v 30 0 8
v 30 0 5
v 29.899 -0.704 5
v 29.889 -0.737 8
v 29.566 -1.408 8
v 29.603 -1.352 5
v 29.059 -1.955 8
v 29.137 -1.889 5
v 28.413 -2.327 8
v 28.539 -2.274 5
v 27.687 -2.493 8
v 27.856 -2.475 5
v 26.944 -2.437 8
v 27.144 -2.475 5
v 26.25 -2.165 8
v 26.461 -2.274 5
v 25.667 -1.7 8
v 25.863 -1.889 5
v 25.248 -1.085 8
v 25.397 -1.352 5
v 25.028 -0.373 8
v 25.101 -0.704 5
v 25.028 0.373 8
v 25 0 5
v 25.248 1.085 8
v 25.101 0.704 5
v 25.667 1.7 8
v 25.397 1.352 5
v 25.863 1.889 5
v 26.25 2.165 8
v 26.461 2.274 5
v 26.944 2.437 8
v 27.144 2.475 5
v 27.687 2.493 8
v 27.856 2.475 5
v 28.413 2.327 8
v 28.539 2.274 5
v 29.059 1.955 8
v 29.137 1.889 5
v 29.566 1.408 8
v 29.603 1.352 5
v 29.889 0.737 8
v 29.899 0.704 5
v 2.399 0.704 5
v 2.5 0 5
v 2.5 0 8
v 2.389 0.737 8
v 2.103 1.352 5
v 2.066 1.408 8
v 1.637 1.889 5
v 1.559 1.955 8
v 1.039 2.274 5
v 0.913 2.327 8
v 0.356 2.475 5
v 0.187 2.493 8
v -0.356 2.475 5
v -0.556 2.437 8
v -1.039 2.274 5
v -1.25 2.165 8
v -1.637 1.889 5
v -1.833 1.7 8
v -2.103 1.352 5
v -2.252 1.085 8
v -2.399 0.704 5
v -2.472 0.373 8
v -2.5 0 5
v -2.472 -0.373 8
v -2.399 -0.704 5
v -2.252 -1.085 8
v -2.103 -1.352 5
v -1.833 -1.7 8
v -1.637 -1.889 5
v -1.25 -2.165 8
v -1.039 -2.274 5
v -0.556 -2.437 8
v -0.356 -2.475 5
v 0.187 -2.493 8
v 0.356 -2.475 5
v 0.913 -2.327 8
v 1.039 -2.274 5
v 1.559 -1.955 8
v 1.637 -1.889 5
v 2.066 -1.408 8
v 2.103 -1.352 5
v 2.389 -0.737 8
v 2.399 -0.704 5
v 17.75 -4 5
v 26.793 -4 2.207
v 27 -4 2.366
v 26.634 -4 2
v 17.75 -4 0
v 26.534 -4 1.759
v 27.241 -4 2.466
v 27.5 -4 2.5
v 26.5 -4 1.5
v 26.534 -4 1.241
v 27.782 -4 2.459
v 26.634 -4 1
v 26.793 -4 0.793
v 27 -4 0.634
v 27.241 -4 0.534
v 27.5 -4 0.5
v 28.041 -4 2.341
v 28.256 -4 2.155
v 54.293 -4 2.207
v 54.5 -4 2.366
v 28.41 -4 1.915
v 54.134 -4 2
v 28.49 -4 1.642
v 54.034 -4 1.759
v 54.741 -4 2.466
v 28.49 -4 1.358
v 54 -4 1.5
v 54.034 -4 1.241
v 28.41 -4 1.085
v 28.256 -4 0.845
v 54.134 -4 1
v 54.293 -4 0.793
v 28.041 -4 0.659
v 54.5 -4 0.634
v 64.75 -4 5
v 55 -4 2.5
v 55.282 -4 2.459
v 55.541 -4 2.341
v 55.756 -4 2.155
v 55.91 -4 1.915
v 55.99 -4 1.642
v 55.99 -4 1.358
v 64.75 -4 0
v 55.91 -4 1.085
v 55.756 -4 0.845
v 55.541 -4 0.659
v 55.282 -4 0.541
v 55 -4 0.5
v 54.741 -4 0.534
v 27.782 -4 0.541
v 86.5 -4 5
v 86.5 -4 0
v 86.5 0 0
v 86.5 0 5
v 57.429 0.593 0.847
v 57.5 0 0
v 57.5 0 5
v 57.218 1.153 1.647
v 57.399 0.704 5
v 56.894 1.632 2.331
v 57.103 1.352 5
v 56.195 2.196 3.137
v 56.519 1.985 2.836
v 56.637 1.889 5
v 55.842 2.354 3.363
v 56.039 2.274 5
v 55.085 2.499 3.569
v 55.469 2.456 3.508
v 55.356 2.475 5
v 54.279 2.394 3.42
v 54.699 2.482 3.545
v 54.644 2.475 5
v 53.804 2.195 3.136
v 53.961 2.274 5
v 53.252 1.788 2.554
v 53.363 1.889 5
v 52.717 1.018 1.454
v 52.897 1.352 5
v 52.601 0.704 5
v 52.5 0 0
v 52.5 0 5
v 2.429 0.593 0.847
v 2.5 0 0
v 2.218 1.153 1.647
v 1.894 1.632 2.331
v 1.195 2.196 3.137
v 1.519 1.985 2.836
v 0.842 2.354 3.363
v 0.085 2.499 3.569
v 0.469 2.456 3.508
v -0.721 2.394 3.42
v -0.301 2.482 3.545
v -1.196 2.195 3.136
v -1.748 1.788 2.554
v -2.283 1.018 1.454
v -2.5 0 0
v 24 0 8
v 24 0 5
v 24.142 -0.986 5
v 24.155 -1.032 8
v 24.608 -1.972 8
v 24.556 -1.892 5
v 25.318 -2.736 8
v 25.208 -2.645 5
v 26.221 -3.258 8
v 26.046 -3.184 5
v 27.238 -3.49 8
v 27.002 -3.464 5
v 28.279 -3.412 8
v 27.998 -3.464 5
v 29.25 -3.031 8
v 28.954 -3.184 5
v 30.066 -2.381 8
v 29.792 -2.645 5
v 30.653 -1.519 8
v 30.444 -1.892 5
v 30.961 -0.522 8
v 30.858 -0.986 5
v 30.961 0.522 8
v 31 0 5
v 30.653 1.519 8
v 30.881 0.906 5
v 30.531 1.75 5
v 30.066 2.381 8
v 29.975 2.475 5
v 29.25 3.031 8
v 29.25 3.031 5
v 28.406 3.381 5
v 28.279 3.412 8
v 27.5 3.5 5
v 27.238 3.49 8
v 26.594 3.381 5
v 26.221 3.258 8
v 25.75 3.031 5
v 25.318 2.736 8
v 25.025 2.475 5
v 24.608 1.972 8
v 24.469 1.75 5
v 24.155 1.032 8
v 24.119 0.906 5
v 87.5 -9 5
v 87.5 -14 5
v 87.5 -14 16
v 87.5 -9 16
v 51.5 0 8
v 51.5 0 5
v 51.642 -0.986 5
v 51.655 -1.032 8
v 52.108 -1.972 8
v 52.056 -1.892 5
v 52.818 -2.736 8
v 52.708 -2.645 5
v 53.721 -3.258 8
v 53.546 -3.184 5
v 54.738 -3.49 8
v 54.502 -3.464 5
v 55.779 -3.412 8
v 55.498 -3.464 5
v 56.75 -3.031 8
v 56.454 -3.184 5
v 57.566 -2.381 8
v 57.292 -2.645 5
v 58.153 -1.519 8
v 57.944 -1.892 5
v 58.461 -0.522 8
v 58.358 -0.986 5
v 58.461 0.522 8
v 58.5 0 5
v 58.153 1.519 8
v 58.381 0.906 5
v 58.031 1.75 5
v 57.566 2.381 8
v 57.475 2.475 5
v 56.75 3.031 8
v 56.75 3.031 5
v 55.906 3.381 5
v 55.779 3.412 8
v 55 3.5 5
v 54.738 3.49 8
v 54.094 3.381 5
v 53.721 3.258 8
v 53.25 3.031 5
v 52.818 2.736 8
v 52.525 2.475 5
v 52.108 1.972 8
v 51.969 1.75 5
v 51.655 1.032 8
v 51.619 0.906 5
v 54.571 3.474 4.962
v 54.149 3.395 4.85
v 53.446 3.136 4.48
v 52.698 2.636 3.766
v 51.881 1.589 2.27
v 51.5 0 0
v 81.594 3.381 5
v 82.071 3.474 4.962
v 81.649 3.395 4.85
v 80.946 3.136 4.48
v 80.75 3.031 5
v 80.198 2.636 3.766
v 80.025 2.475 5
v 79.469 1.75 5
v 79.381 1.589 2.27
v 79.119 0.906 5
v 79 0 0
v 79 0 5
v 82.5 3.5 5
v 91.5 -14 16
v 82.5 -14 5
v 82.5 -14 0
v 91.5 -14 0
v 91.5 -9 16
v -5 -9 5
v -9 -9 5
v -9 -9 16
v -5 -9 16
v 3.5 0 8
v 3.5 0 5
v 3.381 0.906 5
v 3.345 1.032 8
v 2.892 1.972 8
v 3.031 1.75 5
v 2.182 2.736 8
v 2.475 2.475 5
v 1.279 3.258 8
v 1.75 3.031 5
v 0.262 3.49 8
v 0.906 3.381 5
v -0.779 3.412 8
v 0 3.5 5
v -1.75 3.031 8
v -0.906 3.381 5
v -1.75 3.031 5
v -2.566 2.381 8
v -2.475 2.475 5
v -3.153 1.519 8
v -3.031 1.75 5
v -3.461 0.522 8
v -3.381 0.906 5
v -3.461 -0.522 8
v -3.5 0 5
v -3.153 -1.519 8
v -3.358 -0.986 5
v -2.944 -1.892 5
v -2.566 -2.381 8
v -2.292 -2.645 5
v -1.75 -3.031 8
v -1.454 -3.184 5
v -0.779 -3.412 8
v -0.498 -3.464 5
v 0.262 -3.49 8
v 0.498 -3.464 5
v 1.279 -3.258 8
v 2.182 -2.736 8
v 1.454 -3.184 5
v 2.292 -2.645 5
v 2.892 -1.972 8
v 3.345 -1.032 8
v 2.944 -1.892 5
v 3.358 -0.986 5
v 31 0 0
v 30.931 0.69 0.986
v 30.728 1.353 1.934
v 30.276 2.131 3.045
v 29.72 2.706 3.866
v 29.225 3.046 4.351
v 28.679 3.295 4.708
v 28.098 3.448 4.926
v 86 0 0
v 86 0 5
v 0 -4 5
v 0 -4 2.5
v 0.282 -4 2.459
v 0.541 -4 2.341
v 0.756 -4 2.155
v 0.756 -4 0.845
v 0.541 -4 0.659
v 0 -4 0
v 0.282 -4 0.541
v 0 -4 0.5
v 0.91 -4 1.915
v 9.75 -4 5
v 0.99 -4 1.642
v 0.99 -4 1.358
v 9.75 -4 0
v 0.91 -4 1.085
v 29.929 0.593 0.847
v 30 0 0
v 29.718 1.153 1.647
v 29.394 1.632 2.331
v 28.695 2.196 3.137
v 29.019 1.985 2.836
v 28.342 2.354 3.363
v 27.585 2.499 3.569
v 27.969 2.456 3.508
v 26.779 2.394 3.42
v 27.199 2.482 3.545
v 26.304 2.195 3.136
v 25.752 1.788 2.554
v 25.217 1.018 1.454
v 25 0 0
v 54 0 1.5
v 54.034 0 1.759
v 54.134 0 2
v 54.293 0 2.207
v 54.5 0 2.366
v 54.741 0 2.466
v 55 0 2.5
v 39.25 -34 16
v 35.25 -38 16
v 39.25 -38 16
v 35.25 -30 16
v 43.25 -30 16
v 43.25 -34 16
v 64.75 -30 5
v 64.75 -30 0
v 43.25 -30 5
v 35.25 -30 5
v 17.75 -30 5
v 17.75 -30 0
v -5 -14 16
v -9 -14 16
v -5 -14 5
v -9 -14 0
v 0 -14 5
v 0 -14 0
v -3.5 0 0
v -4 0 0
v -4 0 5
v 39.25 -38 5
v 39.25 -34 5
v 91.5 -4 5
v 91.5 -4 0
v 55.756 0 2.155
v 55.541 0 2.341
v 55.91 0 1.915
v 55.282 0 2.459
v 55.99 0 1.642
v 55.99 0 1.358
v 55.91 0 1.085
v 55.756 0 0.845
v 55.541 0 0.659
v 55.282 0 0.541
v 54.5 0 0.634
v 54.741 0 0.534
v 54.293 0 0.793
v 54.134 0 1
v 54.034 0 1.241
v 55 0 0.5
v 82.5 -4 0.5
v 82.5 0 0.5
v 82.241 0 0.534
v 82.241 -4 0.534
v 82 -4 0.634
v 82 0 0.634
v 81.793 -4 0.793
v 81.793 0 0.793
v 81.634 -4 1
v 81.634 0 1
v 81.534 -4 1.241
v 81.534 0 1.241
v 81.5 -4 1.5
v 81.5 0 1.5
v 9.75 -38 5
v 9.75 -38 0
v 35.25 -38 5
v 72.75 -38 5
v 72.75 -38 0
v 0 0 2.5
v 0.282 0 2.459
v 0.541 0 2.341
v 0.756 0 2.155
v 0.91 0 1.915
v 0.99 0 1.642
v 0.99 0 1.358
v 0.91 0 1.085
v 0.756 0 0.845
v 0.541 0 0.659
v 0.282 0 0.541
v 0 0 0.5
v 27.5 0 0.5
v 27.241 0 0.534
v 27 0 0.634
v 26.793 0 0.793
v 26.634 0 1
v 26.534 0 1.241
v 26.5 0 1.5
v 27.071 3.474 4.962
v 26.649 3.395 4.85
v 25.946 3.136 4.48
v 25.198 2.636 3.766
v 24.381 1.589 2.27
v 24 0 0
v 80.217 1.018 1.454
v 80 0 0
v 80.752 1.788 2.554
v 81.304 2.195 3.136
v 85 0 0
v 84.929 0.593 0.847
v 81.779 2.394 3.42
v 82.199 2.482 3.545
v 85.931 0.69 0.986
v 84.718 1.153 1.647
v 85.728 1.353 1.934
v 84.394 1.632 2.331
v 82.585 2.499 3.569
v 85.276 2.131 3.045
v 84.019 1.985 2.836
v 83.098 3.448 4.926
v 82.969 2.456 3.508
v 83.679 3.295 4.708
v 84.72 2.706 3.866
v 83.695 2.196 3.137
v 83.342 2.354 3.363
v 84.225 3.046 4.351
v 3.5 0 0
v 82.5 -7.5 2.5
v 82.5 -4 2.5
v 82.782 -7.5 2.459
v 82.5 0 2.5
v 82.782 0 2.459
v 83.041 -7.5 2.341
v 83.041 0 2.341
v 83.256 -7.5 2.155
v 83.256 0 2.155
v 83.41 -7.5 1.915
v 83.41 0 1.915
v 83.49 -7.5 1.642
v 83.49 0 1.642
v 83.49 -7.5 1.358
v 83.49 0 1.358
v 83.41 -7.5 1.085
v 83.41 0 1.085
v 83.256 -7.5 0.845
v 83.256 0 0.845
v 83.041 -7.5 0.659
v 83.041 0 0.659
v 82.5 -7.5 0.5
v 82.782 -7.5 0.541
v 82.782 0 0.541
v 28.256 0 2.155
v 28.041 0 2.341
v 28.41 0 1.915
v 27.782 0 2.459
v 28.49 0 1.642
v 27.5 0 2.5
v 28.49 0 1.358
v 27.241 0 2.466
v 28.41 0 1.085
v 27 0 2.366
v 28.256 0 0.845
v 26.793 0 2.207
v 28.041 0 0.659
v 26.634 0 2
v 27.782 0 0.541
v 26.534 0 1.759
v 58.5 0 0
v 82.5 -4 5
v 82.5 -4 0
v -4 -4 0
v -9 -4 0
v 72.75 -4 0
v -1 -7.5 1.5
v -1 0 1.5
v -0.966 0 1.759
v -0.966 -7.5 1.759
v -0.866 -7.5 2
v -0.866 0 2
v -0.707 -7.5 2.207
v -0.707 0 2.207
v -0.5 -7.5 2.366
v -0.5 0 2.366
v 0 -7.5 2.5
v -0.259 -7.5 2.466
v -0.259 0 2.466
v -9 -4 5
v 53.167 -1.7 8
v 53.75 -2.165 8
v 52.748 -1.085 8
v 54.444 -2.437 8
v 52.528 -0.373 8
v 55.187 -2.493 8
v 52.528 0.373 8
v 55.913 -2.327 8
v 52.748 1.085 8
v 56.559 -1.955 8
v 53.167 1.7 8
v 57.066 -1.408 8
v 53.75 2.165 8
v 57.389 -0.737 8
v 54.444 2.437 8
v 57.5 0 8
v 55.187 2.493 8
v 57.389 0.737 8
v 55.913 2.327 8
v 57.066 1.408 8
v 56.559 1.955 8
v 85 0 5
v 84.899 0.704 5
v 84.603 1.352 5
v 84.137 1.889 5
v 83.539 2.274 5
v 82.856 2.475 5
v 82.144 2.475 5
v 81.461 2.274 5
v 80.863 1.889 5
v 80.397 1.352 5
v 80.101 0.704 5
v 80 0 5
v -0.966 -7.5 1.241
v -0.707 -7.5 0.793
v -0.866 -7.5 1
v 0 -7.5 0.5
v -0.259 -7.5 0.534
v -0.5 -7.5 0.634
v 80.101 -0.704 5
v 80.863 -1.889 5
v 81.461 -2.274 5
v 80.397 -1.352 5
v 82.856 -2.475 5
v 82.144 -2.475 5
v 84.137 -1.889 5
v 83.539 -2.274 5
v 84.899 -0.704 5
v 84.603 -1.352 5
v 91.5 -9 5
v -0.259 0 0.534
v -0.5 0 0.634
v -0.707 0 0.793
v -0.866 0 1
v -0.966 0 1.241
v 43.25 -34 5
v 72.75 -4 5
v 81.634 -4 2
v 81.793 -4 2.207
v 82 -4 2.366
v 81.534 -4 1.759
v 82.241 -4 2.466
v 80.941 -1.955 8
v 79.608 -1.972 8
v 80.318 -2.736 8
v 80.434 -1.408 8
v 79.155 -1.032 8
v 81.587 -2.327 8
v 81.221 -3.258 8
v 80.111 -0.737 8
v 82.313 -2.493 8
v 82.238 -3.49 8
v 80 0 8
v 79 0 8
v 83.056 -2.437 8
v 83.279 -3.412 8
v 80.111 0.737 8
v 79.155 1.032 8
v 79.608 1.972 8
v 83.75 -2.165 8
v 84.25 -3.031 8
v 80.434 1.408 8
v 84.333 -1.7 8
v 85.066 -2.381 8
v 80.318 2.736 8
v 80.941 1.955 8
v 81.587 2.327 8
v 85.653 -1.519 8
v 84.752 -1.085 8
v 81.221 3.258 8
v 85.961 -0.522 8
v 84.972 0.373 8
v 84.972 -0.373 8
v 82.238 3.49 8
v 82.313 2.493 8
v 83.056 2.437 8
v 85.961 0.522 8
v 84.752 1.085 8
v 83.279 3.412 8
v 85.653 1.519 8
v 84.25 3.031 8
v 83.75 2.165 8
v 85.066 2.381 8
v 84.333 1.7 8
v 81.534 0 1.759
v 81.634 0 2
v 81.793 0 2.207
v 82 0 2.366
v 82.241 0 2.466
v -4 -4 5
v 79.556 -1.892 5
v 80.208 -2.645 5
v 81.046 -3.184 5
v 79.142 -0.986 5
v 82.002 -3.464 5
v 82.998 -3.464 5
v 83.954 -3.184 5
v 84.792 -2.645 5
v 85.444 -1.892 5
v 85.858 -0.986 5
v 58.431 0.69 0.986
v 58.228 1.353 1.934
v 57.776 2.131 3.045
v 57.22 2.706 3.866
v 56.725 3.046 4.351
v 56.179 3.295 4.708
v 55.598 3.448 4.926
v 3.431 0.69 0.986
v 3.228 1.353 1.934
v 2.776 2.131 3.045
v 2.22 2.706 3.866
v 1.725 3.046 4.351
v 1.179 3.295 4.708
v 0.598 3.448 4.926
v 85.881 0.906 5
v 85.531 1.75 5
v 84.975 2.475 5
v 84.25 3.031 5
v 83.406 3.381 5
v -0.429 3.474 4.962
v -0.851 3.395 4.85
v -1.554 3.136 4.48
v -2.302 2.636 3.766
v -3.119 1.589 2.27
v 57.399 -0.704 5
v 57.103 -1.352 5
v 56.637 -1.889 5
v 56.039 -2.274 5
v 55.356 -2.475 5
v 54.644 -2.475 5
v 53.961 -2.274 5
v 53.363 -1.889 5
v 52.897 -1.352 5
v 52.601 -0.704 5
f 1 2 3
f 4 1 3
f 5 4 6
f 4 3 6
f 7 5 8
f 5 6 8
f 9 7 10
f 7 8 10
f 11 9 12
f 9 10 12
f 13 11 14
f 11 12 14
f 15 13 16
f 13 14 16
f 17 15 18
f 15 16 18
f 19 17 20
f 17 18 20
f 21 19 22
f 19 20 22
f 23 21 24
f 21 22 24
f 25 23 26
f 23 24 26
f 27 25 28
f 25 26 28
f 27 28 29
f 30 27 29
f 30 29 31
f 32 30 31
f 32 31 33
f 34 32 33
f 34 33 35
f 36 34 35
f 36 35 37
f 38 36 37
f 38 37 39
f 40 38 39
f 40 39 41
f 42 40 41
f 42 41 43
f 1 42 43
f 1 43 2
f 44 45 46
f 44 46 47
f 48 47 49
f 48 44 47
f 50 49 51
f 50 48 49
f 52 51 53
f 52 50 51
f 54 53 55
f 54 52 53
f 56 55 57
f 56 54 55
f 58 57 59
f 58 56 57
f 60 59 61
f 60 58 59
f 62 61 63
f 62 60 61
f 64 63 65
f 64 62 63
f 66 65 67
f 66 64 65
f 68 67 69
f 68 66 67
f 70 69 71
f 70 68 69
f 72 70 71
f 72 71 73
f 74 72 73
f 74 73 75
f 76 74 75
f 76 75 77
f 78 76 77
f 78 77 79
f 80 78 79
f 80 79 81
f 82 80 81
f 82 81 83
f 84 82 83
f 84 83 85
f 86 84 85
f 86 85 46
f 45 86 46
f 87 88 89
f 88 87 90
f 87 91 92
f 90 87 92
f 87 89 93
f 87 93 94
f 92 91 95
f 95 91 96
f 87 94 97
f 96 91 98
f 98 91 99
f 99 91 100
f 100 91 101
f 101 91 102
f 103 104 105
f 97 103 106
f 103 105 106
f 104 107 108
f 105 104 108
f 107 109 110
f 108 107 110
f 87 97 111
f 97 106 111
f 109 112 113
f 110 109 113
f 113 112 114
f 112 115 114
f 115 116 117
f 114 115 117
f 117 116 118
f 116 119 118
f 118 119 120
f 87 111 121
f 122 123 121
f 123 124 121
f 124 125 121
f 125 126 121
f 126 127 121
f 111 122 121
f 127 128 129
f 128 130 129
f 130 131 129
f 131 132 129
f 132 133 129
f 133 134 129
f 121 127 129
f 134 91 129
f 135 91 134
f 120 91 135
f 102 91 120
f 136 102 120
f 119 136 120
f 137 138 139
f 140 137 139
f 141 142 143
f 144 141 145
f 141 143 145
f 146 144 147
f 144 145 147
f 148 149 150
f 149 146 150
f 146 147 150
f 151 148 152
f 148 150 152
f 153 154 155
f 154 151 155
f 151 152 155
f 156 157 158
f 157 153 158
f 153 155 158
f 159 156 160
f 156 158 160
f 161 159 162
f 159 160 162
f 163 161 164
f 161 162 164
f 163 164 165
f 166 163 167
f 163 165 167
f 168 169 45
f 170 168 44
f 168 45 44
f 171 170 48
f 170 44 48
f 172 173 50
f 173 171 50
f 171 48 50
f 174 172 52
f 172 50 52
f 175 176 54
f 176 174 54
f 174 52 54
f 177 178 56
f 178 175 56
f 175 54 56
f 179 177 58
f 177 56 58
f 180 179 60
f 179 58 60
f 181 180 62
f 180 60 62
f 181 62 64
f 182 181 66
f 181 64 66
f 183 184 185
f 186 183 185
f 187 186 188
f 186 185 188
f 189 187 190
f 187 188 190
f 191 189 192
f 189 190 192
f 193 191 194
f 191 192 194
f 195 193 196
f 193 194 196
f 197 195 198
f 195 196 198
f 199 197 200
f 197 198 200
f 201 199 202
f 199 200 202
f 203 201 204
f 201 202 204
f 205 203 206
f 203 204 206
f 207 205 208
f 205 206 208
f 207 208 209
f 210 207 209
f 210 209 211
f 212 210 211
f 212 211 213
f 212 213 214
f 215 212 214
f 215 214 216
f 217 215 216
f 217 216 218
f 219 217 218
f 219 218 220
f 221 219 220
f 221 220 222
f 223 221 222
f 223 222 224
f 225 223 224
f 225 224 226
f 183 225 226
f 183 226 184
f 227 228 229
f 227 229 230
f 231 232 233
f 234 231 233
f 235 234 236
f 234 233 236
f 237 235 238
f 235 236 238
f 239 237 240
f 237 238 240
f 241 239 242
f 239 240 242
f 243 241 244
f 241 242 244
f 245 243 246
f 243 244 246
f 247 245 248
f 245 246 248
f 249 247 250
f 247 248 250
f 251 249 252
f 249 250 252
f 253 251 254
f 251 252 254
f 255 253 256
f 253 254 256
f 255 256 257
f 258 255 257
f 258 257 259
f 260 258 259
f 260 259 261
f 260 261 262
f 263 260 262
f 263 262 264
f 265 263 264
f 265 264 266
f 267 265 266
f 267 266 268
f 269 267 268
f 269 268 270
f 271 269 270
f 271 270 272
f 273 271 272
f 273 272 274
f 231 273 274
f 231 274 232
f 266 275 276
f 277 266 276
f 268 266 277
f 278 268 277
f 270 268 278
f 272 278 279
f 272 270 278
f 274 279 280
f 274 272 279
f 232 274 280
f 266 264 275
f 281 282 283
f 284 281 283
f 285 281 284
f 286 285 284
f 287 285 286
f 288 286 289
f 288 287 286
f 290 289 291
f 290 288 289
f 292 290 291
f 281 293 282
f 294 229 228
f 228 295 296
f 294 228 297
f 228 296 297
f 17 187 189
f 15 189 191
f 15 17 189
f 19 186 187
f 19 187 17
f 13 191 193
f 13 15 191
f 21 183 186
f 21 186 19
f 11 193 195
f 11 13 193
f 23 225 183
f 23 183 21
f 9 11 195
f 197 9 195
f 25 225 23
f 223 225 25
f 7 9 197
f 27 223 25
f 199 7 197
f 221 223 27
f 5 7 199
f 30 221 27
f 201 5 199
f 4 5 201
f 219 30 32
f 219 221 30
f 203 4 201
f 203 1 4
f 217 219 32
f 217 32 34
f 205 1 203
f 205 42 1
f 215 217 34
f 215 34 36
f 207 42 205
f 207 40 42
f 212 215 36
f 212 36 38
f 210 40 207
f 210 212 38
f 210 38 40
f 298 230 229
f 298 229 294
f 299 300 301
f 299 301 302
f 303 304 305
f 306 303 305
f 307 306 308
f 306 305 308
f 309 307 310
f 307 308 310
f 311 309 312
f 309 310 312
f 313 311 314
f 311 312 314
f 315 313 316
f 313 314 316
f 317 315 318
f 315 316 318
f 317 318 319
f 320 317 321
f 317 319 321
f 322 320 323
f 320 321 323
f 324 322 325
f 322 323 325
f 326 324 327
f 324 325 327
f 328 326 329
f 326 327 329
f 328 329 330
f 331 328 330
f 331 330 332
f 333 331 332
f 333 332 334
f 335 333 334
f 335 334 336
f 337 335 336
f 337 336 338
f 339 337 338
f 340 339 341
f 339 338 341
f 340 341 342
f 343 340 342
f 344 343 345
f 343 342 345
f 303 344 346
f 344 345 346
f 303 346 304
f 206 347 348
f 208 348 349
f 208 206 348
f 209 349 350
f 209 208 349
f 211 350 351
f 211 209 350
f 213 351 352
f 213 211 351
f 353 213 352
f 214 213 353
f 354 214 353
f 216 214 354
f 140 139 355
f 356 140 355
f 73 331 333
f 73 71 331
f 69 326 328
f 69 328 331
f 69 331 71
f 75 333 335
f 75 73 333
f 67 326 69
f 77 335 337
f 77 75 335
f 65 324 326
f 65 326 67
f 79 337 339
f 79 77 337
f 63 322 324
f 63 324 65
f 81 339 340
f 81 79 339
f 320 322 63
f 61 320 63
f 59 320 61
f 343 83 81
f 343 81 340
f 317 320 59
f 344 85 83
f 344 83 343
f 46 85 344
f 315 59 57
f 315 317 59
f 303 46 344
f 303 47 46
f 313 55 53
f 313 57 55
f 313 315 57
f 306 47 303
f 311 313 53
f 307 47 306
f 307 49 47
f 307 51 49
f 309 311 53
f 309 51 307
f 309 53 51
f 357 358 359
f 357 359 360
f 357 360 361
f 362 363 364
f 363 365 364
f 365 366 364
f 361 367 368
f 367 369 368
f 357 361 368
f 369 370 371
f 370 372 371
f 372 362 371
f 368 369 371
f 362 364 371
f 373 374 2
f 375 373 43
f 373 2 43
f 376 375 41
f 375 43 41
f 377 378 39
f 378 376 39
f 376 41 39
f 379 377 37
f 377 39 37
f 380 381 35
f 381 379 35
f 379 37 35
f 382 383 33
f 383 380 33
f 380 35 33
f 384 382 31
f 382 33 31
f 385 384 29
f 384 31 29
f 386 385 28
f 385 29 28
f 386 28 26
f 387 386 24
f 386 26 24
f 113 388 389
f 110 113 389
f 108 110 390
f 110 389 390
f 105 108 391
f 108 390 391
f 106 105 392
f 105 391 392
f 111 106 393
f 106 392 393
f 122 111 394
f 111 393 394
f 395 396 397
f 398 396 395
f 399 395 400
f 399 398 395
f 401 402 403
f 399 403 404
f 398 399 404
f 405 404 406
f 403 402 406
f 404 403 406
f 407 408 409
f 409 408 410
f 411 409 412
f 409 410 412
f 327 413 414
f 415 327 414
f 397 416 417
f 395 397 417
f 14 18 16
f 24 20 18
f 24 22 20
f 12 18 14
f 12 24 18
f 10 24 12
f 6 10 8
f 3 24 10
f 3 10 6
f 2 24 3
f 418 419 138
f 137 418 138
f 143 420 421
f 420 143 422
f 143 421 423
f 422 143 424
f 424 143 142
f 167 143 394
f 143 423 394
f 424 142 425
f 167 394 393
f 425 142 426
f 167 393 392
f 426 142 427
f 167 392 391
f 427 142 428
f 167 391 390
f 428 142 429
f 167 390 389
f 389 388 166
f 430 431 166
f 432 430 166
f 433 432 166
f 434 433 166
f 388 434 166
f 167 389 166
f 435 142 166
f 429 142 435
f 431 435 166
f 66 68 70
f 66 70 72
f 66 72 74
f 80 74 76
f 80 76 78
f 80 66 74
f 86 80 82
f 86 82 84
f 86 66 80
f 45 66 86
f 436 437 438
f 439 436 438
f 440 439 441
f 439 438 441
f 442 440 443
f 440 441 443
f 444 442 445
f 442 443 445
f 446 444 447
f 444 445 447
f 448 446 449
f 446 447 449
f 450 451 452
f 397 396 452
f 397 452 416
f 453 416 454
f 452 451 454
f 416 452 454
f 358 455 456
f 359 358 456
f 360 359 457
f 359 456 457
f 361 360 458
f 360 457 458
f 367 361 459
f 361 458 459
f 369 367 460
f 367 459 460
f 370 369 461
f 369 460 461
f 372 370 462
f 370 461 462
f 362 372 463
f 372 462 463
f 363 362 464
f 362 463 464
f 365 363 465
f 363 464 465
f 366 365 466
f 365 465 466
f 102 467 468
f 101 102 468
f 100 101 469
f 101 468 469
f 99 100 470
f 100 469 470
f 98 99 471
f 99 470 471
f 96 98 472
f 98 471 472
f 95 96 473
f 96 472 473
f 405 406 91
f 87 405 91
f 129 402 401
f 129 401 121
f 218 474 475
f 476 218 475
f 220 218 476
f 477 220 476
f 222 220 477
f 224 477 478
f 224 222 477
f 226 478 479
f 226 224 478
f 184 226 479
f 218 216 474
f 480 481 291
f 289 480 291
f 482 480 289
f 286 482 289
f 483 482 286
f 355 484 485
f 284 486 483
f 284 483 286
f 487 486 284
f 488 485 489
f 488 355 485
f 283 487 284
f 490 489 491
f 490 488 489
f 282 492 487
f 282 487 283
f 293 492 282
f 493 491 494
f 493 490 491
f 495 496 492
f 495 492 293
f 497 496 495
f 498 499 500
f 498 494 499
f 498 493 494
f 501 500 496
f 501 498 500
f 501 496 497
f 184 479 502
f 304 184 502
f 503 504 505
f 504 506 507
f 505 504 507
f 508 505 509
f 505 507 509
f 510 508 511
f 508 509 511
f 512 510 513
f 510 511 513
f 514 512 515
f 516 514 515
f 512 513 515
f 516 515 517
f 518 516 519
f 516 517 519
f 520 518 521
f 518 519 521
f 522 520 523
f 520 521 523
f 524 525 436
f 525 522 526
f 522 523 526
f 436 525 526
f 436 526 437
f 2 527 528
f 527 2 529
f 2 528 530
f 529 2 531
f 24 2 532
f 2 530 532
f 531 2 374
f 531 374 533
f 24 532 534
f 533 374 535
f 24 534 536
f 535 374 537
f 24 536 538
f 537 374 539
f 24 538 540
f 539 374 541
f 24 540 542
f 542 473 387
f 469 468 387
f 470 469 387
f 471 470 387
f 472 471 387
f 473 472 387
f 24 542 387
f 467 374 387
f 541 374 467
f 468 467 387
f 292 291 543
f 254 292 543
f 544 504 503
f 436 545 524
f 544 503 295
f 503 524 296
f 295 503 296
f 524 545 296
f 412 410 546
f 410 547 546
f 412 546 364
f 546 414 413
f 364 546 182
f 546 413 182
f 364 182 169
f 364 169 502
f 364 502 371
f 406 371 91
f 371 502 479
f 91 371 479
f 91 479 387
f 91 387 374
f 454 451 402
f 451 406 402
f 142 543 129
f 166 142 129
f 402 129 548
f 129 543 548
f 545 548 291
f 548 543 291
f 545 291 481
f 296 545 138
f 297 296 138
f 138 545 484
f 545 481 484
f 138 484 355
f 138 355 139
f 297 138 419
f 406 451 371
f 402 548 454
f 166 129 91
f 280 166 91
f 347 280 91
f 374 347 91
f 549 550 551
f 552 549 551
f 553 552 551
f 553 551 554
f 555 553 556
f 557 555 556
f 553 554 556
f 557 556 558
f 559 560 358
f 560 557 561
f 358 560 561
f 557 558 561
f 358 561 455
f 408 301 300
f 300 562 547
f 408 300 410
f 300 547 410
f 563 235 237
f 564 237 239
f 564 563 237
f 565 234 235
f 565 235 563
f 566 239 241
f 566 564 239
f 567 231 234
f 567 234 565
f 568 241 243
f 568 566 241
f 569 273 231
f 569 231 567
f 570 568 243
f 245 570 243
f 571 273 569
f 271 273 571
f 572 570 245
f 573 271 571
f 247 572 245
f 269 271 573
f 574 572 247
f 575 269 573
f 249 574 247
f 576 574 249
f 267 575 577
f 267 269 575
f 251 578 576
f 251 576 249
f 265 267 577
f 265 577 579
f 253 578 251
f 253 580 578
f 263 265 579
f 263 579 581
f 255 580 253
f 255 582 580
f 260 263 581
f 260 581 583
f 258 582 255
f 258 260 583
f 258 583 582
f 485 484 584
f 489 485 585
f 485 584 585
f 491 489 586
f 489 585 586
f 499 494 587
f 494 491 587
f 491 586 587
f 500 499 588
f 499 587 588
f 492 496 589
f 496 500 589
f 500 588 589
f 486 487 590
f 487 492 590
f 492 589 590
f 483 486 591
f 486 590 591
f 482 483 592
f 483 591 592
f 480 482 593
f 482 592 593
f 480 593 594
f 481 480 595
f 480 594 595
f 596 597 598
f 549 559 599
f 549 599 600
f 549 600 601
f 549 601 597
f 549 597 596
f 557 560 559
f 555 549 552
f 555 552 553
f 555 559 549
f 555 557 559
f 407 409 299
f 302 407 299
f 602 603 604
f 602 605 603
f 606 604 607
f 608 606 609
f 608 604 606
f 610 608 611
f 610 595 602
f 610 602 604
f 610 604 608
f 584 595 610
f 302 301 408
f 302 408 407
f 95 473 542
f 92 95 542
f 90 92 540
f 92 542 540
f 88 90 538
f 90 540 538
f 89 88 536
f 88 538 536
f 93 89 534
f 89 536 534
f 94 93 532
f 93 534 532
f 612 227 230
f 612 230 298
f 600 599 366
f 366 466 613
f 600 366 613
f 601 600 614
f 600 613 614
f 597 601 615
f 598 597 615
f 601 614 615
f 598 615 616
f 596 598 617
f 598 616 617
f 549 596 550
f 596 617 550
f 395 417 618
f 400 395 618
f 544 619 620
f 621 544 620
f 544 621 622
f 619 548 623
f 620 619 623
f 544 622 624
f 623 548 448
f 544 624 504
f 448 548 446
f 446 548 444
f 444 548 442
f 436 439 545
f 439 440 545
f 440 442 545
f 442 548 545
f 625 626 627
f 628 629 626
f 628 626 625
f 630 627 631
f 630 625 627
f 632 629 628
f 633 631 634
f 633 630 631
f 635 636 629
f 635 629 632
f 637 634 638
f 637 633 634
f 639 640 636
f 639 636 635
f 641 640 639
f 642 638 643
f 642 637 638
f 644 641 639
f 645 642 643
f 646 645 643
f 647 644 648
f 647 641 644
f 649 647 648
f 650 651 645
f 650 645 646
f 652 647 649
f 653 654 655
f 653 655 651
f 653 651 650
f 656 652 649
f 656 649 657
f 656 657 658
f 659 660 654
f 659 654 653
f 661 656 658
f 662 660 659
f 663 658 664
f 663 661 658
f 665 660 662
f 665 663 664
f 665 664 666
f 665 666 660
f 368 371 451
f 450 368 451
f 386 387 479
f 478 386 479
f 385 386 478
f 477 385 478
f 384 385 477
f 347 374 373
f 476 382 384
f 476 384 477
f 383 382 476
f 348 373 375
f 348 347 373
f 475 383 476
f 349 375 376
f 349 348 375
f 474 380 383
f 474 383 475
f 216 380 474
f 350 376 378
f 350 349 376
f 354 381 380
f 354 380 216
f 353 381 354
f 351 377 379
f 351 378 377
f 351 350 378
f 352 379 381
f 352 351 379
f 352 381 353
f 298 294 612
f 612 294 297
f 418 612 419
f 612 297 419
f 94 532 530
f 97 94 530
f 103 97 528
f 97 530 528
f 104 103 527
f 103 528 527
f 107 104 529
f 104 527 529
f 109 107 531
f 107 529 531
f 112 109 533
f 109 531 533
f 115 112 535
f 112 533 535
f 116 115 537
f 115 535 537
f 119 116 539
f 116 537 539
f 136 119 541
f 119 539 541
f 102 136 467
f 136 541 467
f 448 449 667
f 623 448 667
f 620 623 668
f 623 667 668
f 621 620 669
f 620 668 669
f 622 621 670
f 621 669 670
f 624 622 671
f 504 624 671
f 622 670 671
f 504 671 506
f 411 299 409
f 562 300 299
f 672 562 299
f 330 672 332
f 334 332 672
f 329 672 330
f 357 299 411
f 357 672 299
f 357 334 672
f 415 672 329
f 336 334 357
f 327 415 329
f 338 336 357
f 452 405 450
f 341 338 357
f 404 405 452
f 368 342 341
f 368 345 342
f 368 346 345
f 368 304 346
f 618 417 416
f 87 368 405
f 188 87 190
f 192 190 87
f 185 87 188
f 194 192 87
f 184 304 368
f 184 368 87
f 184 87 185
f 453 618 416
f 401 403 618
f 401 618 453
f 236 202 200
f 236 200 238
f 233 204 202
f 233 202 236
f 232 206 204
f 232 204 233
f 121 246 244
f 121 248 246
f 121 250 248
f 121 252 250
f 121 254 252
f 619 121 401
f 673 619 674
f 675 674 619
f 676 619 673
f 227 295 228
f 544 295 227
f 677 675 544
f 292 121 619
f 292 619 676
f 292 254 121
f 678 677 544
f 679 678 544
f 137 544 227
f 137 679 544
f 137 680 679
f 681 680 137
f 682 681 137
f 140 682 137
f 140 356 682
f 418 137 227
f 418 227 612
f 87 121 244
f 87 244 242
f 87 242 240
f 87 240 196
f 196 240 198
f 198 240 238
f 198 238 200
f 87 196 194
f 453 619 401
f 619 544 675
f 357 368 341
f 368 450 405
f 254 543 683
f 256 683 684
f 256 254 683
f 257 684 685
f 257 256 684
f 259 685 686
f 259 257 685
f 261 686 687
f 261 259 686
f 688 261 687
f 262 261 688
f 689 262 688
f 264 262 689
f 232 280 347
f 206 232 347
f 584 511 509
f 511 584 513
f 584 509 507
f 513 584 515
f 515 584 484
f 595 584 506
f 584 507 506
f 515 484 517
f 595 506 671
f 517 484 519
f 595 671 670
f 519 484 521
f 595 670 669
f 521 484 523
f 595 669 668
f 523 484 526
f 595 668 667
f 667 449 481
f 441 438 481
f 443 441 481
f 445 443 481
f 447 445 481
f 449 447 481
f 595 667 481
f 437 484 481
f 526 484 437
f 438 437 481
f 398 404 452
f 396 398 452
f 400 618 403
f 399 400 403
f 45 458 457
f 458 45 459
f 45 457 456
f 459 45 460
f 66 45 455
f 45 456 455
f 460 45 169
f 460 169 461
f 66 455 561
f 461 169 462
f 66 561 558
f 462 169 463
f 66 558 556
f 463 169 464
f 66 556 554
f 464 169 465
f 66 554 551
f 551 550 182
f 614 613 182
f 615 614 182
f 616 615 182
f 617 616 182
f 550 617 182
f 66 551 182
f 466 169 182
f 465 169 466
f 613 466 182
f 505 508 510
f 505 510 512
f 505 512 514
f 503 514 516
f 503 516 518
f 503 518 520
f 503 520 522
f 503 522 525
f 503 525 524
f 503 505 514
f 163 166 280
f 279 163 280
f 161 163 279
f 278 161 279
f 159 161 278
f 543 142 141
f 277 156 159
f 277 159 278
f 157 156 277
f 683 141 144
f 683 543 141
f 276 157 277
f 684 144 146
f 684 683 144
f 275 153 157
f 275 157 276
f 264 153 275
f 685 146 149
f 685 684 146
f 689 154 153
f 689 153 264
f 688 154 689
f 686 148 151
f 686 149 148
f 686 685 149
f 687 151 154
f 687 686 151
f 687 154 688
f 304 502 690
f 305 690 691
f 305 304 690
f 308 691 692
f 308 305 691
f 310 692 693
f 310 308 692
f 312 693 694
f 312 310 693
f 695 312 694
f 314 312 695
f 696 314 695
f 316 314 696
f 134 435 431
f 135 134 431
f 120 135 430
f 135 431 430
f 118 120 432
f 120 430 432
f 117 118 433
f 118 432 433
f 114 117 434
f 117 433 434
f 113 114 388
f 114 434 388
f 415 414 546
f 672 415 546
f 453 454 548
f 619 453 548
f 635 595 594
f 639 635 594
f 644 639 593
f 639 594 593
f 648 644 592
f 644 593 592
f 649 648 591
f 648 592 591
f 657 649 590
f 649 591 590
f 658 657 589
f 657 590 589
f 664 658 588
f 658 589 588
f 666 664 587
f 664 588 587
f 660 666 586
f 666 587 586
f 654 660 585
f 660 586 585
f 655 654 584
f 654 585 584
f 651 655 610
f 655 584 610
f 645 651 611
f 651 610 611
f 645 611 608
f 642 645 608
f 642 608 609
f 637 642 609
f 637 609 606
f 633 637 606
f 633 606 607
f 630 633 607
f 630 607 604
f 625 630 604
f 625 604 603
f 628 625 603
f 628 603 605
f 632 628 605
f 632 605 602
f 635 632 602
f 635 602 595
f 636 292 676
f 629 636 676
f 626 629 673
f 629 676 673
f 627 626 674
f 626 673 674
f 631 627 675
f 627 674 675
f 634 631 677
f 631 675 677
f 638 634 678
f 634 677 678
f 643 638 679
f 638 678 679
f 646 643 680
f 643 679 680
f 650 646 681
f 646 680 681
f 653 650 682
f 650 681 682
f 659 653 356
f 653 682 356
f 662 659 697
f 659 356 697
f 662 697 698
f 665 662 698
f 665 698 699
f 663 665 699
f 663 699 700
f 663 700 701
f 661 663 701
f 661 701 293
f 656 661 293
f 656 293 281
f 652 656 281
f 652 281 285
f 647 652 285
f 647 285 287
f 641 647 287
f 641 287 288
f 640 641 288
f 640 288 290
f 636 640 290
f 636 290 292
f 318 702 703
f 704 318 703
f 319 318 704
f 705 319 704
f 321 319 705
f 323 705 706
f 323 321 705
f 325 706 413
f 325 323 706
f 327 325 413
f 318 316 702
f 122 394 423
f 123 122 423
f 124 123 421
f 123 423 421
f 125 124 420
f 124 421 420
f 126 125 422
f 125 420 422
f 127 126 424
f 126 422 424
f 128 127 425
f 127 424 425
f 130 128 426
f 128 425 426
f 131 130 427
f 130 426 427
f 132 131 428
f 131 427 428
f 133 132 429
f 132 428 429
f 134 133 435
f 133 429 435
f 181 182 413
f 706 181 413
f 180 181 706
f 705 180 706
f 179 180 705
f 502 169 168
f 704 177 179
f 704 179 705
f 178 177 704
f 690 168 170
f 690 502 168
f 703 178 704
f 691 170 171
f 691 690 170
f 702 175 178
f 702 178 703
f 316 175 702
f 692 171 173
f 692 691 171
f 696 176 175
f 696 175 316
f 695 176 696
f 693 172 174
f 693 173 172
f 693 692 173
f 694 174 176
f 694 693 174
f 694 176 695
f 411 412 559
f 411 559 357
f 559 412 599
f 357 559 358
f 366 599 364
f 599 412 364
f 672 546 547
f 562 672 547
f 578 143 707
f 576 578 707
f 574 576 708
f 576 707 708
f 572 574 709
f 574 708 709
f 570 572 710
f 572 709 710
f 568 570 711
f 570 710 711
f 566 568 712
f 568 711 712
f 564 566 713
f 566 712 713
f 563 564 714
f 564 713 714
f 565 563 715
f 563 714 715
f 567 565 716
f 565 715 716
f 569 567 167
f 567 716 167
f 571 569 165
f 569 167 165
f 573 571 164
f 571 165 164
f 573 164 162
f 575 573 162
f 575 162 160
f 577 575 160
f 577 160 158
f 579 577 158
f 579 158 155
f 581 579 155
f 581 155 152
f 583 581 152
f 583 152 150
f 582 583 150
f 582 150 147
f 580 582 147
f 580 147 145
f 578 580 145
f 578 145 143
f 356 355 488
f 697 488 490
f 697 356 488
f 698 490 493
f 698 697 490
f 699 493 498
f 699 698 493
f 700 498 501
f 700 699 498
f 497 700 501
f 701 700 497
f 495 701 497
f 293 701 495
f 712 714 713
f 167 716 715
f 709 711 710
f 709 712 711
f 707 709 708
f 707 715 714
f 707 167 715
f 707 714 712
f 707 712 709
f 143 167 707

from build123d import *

# Parameters (mm, degrees)
F0_W         = 4
F0_H         = 26
F0_W_2       = 2
F0_H_2       = 4
F0_H_3       = 5
F1_DEPTH     = 5
F2_DEPTH     = 16
F3_R         = 3.5
F3_R_2       = 2.5
F4_DEPTH     = 3
F6_DEPTH     = 7.5
F7_T4_DEPTH  = 26.8255996257
F7_S5_R      = 3.5
F7_T6_DEPTH  = 15
F7_S7_R      = 2.5
F7_T8_DEPTH  = 15
F7_T12_DEPTH = 26.8255996257
F7_S13_R     = 3.5
F7_T14_DEPTH = 15
F7_S15_R     = 2.5
F7_T16_DEPTH = 15
F7_T20_DEPTH = 26.8255996257
F7_S21_R     = 3.5
F7_T22_DEPTH = 15
F7_S23_R     = 2.5
F7_T24_DEPTH = 15
F7_T28_DEPTH = 26.8255996257
F7_S29_R     = 3.5
F7_T30_DEPTH = 15
F7_S31_R     = 2.5
F7_T32_DEPTH = 15
F7_T36_DEPTH = 26.8255996257
F7_S37_R     = 3.5
F7_T38_DEPTH = 15
F7_S39_R     = 2.5
F7_T40_DEPTH = 15
F7_T44_DEPTH = 26.8255996257
F7_S45_R     = 3.5
F7_T46_DEPTH = 15
F7_S47_R     = 2.5
F7_T48_DEPTH = 15
F7_T52_DEPTH = 26.8255996257
F7_S53_R     = 3.5
F7_T54_DEPTH = 15
F7_S55_R     = 2.5
F7_T56_DEPTH = 15
F7_T60_DEPTH = 26.8255996257
F7_S61_R     = 3.5
F7_T62_DEPTH = 15
F7_S63_R     = 2.5
F7_T64_DEPTH = 15


# Not quite as in the source:
# - a fillet or chamfer that OpenCascade refuses, or shapes differently, is made with other operations: its cross-section is extruded or revolved along the edge and cut away or added


with BuildPart() as f1:
    # F0 (on Top) → F1 (new body)
    with BuildSketch(Plane.XY):
        with BuildLine():
            ThreePointArc((27.5, -4), (24.6715728753, -2.8284271247), (23.5, 0))
            Line((23.5, 0), (17.75, 0))
            Line((17.75, 0), (17.75, -4))
            Line((17.75, -4), (27.5, -4))
        make_face()
        with Locations((15.75, -17)):
            Rectangle(F0_W, F0_H)
        with BuildLine():
            Line((52.5, 0), (51, 0))
            ThreePointArc((51, 0), (52.1715728753, -2.8284271247), (55, -4))
            Line((55, -4), (55, -2.5))
            ThreePointArc((55, -2.5), (53.232233047, -1.767766953), (52.5, 0))
        make_face()
        with Locations((42.25, -32)):
            Rectangle(F0_W_2, F0_H_2)
        with BuildLine():
            ThreePointArc((82.5, -2.5), (84.267766953, -1.767766953), (85, 0))
            Line((85, 0), (82.5, 0))
            Line((82.5, 0), (82.5, -2.5))
        make_face()
        with BuildLine():
            Line((82.5, 0), (80, 0))
            ThreePointArc((80, 0), (80.732233047, -1.767766953), (82.5, -2.5))
            Line((82.5, -2.5), (82.5, 0))
        make_face()
        Polygon((47.25, -38), (47.25, -30), (43.25, -30), (43.25, -34), (43.25, -38), align=None)
        with BuildLine():
            Line((64.75, 0), (59, 0))
            ThreePointArc((59, 0), (57.8284271247, -2.8284271247), (55, -4))
            Line((55, -4), (64.75, -4))
            Line((64.75, -4), (64.75, 0))
        make_face()
        with Locations((11.75, -2)):
            Rectangle(F0_W, F0_H_2)
        with Locations((42.25, -36)):
            Rectangle(F0_W_2, F0_H_2)
        with Locations((40.25, -32)):
            Rectangle(F0_W_2, F0_H_2)
        with Locations((11.75, -17)):
            Rectangle(F0_W, F0_H)
        with Locations((70.75, -2)):
            Rectangle(F0_W, F0_H_2)
        with BuildLine():
            Line((25, 0), (23.5, 0))
            ThreePointArc((23.5, 0), (24.6715728753, -2.8284271247), (27.5, -4))
            Line((27.5, -4), (27.5, -2.5))
            ThreePointArc((27.5, -2.5), (25.732233047, -1.767766953), (25, 0))
        make_face()
        with Locations((40.25, -36)):
            Rectangle(F0_W_2, F0_H_2)
        Polygon((35.25, -30), (35.25, -38), (39.25, -38), (39.25, -34), (39.25, -30), align=None)
        with BuildLine():
            ThreePointArc((55, -4), (57.8284271247, -2.8284271247), (59, 0))
            Line((59, 0), (57.5, 0))
            ThreePointArc((57.5, 0), (56.767766953, -1.767766953), (55, -2.5))
            Line((55, -2.5), (55, -4))
        make_face()
        with Locations((70.75, -17)):
            Rectangle(F0_W, F0_H)
        with Locations((66.75, -2)):
            Rectangle(F0_W, F0_H_2)
        with BuildLine():
            Line((55, 0), (52.5, 0))
            ThreePointArc((52.5, 0), (53.232233047, -1.767766953), (55, -2.5))
            Line((55, -2.5), (55, 0))
        make_face()
        with BuildLine():
            Line((0, -4), (0, -2.5))
            ThreePointArc((0, -2.5), (-1.767766953, -1.767766953), (-2.5, 0))
            Line((-2.5, 0), (-4, 0))
            ThreePointArc((-4, 0), (-2.8284271247, -2.8284271247), (0, -4))
        make_face()
        Polygon((86.5, -4), (82.5, -4), (82.5, -14), (87.5, -14), (87.5, -9), (87.5, -4), align=None)
        with BuildLine():
            Line((-4, -4), (0, -4))
            ThreePointArc((0, -4), (-2.8284271247, -2.8284271247), (-4, 0))
            Line((-4, 0), (-4, -4))
        make_face()
        with BuildLine():
            Line((86.5, -4), (86.5, 0))
            ThreePointArc((86.5, 0), (85.3284271247, -2.8284271247), (82.5, -4))
            Line((82.5, -4), (86.5, -4))
        make_face()
        with Locations((-7, -6.5)):
            Rectangle(F0_W, F0_H_3)
        with Locations((89.5, -6.5)):
            Rectangle(F0_W, F0_H_3)
        with Locations((-7, -11.5)):
            Rectangle(F0_W, F0_H_3)
        with Locations((89.5, -11.5)):
            Rectangle(F0_W, F0_H_3)
        with BuildLine():
            Line((2.5, 0), (0, 0))
            Line((0, 0), (0, -2.5))
            ThreePointArc((0, -2.5), (1.767766953, -1.767766953), (2.5, 0))
        make_face()
        with BuildLine():
            Line((9.75, 0), (4, 0))
            ThreePointArc((4, 0), (2.8284271247, -2.8284271247), (0, -4))
            Line((0, -4), (9.75, -4))
            Line((9.75, -4), (9.75, 0))
        make_face()
        with BuildLine():
            Line((27.5, 0), (25, 0))
            ThreePointArc((25, 0), (25.732233047, -1.767766953), (27.5, -2.5))
            Line((27.5, -2.5), (27.5, 0))
        make_face()
        with BuildLine():
            ThreePointArc((27.5, -2.5), (29.267766953, -1.767766953), (30, 0))
            Line((30, 0), (27.5, 0))
            Line((27.5, 0), (27.5, -2.5))
        make_face()
        with Locations((66.75, -17)):
            Rectangle(F0_W, F0_H)
        with BuildLine():
            ThreePointArc((27.5, -4), (30.3284271247, -2.8284271247), (31.5, 0))
            Line((31.5, 0), (30, 0))
            ThreePointArc((30, 0), (29.267766953, -1.767766953), (27.5, -2.5))
            Line((27.5, -2.5), (27.5, -4))
        make_face()
        with BuildLine():
            Line((0, -2.5), (0, 0))
            Line((0, 0), (-2.5, 0))
            ThreePointArc((-2.5, 0), (-1.767766953, -1.767766953), (0, -2.5))
        make_face()
        with BuildLine():
            ThreePointArc((55, -2.5), (56.767766953, -1.767766953), (57.5, 0))
            Line((57.5, 0), (55, 0))
            Line((55, 0), (55, -2.5))
        make_face()
        with BuildLine():
            ThreePointArc((82.5, -4), (85.3284271247, -2.8284271247), (86.5, 0))
            Line((86.5, 0), (85, 0))
            ThreePointArc((85, 0), (84.267766953, -1.767766953), (82.5, -2.5))
            Line((82.5, -2.5), (82.5, -4))
        make_face()
        Polygon((13.75, -30), (9.75, -30), (9.75, -38), (35.25, -38), (35.25, -30), (17.75, -30), align=None)
        with BuildLine():
            Line((51, 0), (31.5, 0))
            ThreePointArc((31.5, 0), (30.3284271247, -2.8284271247), (27.5, -4))
            Line((27.5, -4), (55, -4))
            ThreePointArc((55, -4), (52.1715728753, -2.8284271247), (51, 0))
        make_face()
        with BuildLine():
            ThreePointArc((82.5, -4), (79.6715728753, -2.8284271247), (78.5, 0))
            Line((78.5, 0), (72.75, 0))
            Line((72.75, 0), (72.75, -4))
            Line((72.75, -4), (82.5, -4))
        make_face()
        with Locations((15.75, -2)):
            Rectangle(F0_W, F0_H_2)
        with BuildLine():
            Line((4, 0), (2.5, 0))
            ThreePointArc((2.5, 0), (1.767766953, -1.767766953), (0, -2.5))
            Line((0, -2.5), (0, -4))
            ThreePointArc((0, -4), (2.8284271247, -2.8284271247), (4, 0))
        make_face()
        Polygon((68.75, -30), (64.75, -30), (47.25, -30), (47.25, -38), (72.75, -38), (72.75, -30), align=None)
        Polygon((0, -14), (0, -4), (-4, -4), (-5, -4), (-5, -9), (-5, -14), align=None)
        with BuildLine():
            Line((80, 0), (78.5, 0))
            ThreePointArc((78.5, 0), (79.6715728753, -2.8284271247), (82.5, -4))
            Line((82.5, -4), (82.5, -2.5))
            ThreePointArc((82.5, -2.5), (80.732233047, -1.767766953), (80, 0))
        make_face()
    extrude(amount=F1_DEPTH)

    # F0 (on Top) → F2 (join)
    with BuildSketch(Plane.XY):
        with Locations((-7, -11.5)):
            Rectangle(F0_W, F0_H_3)
        with Locations((89.5, -11.5)):
            Rectangle(F0_W, F0_H_3)
        Polygon((35.25, -30), (35.25, -38), (39.25, -38), (39.25, -34), (39.25, -30), align=None)
        with Locations((40.25, -32)):
            Rectangle(F0_W_2, F0_H_2)
        with Locations((42.25, -32)):
            Rectangle(F0_W_2, F0_H_2)
    extrude(amount=F2_DEPTH)

    # F3 (on face) → F4 (join)
    with BuildSketch(Plane.XY.offset(5)):
        Circle(F3_R)
        Circle(F3_R_2, mode=Mode.SUBTRACT)
        with BuildLine():
            ThreePointArc((86, 0), (82.5, 3.5), (79, 0))
            ThreePointArc((79, 0), (82.5, -3.5), (86, 0))
        make_face()
        with BuildLine():
            ThreePointArc((85, 0), (82.5, -2.5), (80, 0))
            ThreePointArc((80, 0), (82.5, 2.5), (85, 0))
        make_face(mode=Mode.SUBTRACT)
        with BuildLine():
            ThreePointArc((58.5, 0), (55, 3.5), (51.5, 0))
            Line((51.5, 0), (52.5, 0))
            ThreePointArc((52.5, 0), (55, 2.5), (57.5, 0))
            Line((57.5, 0), (58.5, 0))
        make_face()
        with BuildLine():
            Line((52.5, 0), (51.5, 0))
            ThreePointArc((51.5, 0), (55, -3.5), (58.5, 0))
            Line((58.5, 0), (57.5, 0))
            ThreePointArc((57.5, 0), (55, -2.5), (52.5, 0))
        make_face()
        with BuildLine():
            ThreePointArc((31, 0), (27.5, 3.5), (24, 0))
            Line((24, 0), (25, 0))
            ThreePointArc((25, 0), (27.5, 2.5), (30, 0))
            Line((30, 0), (31, 0))
        make_face()
        with BuildLine():
            Line((25, 0), (24, 0))
            ThreePointArc((24, 0), (27.5, -3.5), (31, 0))
            Line((31, 0), (30, 0))
            ThreePointArc((30, 0), (27.5, -2.5), (25, 0))
        make_face()
    extrude(amount=F4_DEPTH)

    # F5 (on face) → F6 (cut)
    with BuildSketch(Plane(origin=(0, 0, 0), x_dir=(-1, 0, 0), z_dir=(0, 1, 0))):
        with BuildLine():
            ThreePointArc((0, 2.5), (-1, 1.5), (0, 0.5))
            Line((0, 0.5), (0, 2.5))
        make_face()
        with BuildLine():
            Line((0, 2.5), (0, 0.5))
            ThreePointArc((0, 0.5), (0.7071067812, 0.7928932188), (1, 1.5))
            ThreePointArc((1, 1.5), (0.7071067812, 2.2071067812), (0, 2.5))
        make_face()
        with BuildLine():
            ThreePointArc((-82.5, 2.5), (-83.5, 1.5), (-82.5, 0.5))
            Line((-82.5, 0.5), (-82.5, 2.5))
        make_face()
        with BuildLine():
            Line((-82.5, 2.5), (-82.5, 0.5))
            ThreePointArc((-82.5, 0.5), (-81.7928932188, 0.7928932188), (-81.5, 1.5))
            ThreePointArc((-81.5, 1.5), (-81.7928932188, 2.2071067812), (-82.5, 2.5))
        make_face()
        with BuildLine():
            ThreePointArc((-55, 2.5), (-56, 1.5), (-55, 0.5))
            Line((-55, 0.5), (-55, 2.5))
        make_face()
        with BuildLine():
            Line((-55, 2.5), (-55, 0.5))
            ThreePointArc((-55, 0.5), (-54.2928932188, 0.7928932188), (-54, 1.5))
            ThreePointArc((-54, 1.5), (-54.2928932188, 2.2071067812), (-55, 2.5))
        make_face()
        with BuildLine():
            ThreePointArc((-27.5, 2.5), (-28.5, 1.5), (-27.5, 0.5))
            Line((-27.5, 0.5), (-27.5, 2.5))
        make_face()
        with BuildLine():
            Line((-27.5, 2.5), (-27.5, 0.5))
            ThreePointArc((-27.5, 0.5), (-26.7928932188, 0.7928932188), (-26.5, 1.5))
            ThreePointArc((-26.5, 1.5), (-26.7928932188, 2.2071067812), (-27.5, 2.5))
        make_face()
    extrude(amount=-F6_DEPTH, mode=Mode.SUBTRACT)

    # F7: chamfer of 5 x 3.5 on 8 edges, made by hand


with BuildPart() as f7_tool2:
    # F7_s3 → F7_t4 (new body)
    with BuildSketch(Plane.YZ.offset(16.4127998128)):
        Polygon((0, 0), (3.5, 5), (0, 5), align=None)
    extrude(amount=-F7_T4_DEPTH)

    # F7_s5 → F7_t6 (intersect, symmetric)
    with BuildSketch(Plane.XY.offset(2.5)):
        Circle(F7_S5_R)
    extrude(amount=F7_T6_DEPTH, both=True, mode=Mode.INTERSECT)

    # F7_s7 → F7_t8 (cut, symmetric)
    with BuildSketch(Plane.XY.offset(2.5)):
        Circle(F7_S7_R)
    extrude(amount=F7_T8_DEPTH, both=True, mode=Mode.SUBTRACT)


with BuildPart() as f1_1:
    add(f1.part)

    # F7_t1: union F7_tool2
    add(f7_tool2.part)


with BuildPart() as f7_tool10:
    # F7_s11 → F7_t12 (new body)
    with BuildSketch(Plane.YZ.offset(37.9127998128)):
        Polygon((0, 0), (3.5, 5), (0, 5), align=None)
    extrude(amount=-F7_T12_DEPTH)

    # F7_s13 → F7_t14 (intersect, symmetric)
    with BuildSketch(Plane.XY.offset(2.5)):
        with Locations((27.5, 0)):
            Circle(F7_S13_R)
    extrude(amount=F7_T14_DEPTH, both=True, mode=Mode.INTERSECT)

    # F7_s15 → F7_t16 (cut, symmetric)
    with BuildSketch(Plane.XY.offset(2.5)):
        with Locations((27.5, 0)):
            Circle(F7_S15_R)
    extrude(amount=F7_T16_DEPTH, both=True, mode=Mode.SUBTRACT)


with BuildPart() as f1_2:
    add(f1_1.part)

    # F7_t9: union F7_tool10
    add(f7_tool10.part)


with BuildPart() as f7_tool18:
    # F7_s19 → F7_t20 (new body)
    with BuildSketch(Plane.YZ.offset(65.4127998128)):
        Polygon((0, 0), (3.5, 5), (0, 5), align=None)
    extrude(amount=-F7_T20_DEPTH)

    # F7_s21 → F7_t22 (intersect, symmetric)
    with BuildSketch(Plane.XY.offset(2.5)):
        with Locations((55, 0)):
            Circle(F7_S21_R)
    extrude(amount=F7_T22_DEPTH, both=True, mode=Mode.INTERSECT)

    # F7_s23 → F7_t24 (cut, symmetric)
    with BuildSketch(Plane.XY.offset(2.5)):
        with Locations((55, 0)):
            Circle(F7_S23_R)
    extrude(amount=F7_T24_DEPTH, both=True, mode=Mode.SUBTRACT)


with BuildPart() as f1_3:
    add(f1_2.part)

    # F7_t17: union F7_tool18
    add(f7_tool18.part)


with BuildPart() as f7_tool26:
    # F7_s27 → F7_t28 (new body)
    with BuildSketch(Plane.YZ.offset(43.9127998128)):
        Polygon((0, 0), (3.5, 5), (0, 5), align=None)
    extrude(amount=-F7_T28_DEPTH)

    # F7_s29 → F7_t30 (intersect, symmetric)
    with BuildSketch(Plane.XY.offset(2.5)):
        with Locations((27.5, 0)):
            Circle(F7_S29_R)
    extrude(amount=F7_T30_DEPTH, both=True, mode=Mode.INTERSECT)

    # F7_s31 → F7_t32 (cut, symmetric)
    with BuildSketch(Plane.XY.offset(2.5)):
        with Locations((27.5, 0)):
            Circle(F7_S31_R)
    extrude(amount=F7_T32_DEPTH, both=True, mode=Mode.SUBTRACT)


with BuildPart() as f1_4:
    add(f1_3.part)

    # F7_t25: union F7_tool26
    add(f7_tool26.part)


with BuildPart() as f7_tool34:
    # F7_s35 → F7_t36 (new body)
    with BuildSketch(Plane.YZ.offset(92.9127998128)):
        Polygon((0, 0), (3.5, 5), (0, 5), align=None)
    extrude(amount=-F7_T36_DEPTH)

    # F7_s37 → F7_t38 (intersect, symmetric)
    with BuildSketch(Plane.XY.offset(2.5)):
        with Locations((82.5, 0)):
            Circle(F7_S37_R)
    extrude(amount=F7_T38_DEPTH, both=True, mode=Mode.INTERSECT)

    # F7_s39 → F7_t40 (cut, symmetric)
    with BuildSketch(Plane.XY.offset(2.5)):
        with Locations((82.5, 0)):
            Circle(F7_S39_R)
    extrude(amount=F7_T40_DEPTH, both=True, mode=Mode.SUBTRACT)


with BuildPart() as f1_5:
    add(f1_4.part)

    # F7_t33: union F7_tool34
    add(f7_tool34.part)


with BuildPart() as f7_tool42:
    # F7_s43 → F7_t44 (new body)
    with BuildSketch(Plane.YZ.offset(71.4127998128)):
        Polygon((0, 0), (3.5, 5), (0, 5), align=None)
    extrude(amount=-F7_T44_DEPTH)

    # F7_s45 → F7_t46 (intersect, symmetric)
    with BuildSketch(Plane.XY.offset(2.5)):
        with Locations((55, 0)):
            Circle(F7_S45_R)
    extrude(amount=F7_T46_DEPTH, both=True, mode=Mode.INTERSECT)

    # F7_s47 → F7_t48 (cut, symmetric)
    with BuildSketch(Plane.XY.offset(2.5)):
        with Locations((55, 0)):
            Circle(F7_S47_R)
    extrude(amount=F7_T48_DEPTH, both=True, mode=Mode.SUBTRACT)


with BuildPart() as f1_6:
    add(f1_5.part)

    # F7_t41: union F7_tool42
    add(f7_tool42.part)


with BuildPart() as f7_tool50:
    # F7_s51 → F7_t52 (new body)
    with BuildSketch(Plane.YZ.offset(10.4127998128)):
        Polygon((0, 0), (3.5, 5), (0, 5), align=None)
    extrude(amount=-F7_T52_DEPTH)

    # F7_s53 → F7_t54 (intersect, symmetric)
    with BuildSketch(Plane.XY.offset(2.5)):
        Circle(F7_S53_R)
    extrude(amount=F7_T54_DEPTH, both=True, mode=Mode.INTERSECT)

    # F7_s55 → F7_t56 (cut, symmetric)
    with BuildSketch(Plane.XY.offset(2.5)):
        Circle(F7_S55_R)
    extrude(amount=F7_T56_DEPTH, both=True, mode=Mode.SUBTRACT)


with BuildPart() as f1_7:
    add(f1_6.part)

    # F7_t49: union F7_tool50
    add(f7_tool50.part)


with BuildPart() as f7_tool58:
    # F7_s59 → F7_t60 (new body)
    with BuildSketch(Plane.YZ.offset(98.9127998128)):
        Polygon((0, 0), (3.5, 5), (0, 5), align=None)
    extrude(amount=-F7_T60_DEPTH)

    # F7_s61 → F7_t62 (intersect, symmetric)
    with BuildSketch(Plane.XY.offset(2.5)):
        with Locations((82.5, 0)):
            Circle(F7_S61_R)
    extrude(amount=F7_T62_DEPTH, both=True, mode=Mode.INTERSECT)

    # F7_s63 → F7_t64 (cut, symmetric)
    with BuildSketch(Plane.XY.offset(2.5)):
        with Locations((82.5, 0)):
            Circle(F7_S63_R)
    extrude(amount=F7_T64_DEPTH, both=True, mode=Mode.SUBTRACT)


with BuildPart() as f1_8:
    add(f1_7.part)

    # F7_t57: union F7_tool58
    add(f7_tool58.part)


solid = f1_8.part
